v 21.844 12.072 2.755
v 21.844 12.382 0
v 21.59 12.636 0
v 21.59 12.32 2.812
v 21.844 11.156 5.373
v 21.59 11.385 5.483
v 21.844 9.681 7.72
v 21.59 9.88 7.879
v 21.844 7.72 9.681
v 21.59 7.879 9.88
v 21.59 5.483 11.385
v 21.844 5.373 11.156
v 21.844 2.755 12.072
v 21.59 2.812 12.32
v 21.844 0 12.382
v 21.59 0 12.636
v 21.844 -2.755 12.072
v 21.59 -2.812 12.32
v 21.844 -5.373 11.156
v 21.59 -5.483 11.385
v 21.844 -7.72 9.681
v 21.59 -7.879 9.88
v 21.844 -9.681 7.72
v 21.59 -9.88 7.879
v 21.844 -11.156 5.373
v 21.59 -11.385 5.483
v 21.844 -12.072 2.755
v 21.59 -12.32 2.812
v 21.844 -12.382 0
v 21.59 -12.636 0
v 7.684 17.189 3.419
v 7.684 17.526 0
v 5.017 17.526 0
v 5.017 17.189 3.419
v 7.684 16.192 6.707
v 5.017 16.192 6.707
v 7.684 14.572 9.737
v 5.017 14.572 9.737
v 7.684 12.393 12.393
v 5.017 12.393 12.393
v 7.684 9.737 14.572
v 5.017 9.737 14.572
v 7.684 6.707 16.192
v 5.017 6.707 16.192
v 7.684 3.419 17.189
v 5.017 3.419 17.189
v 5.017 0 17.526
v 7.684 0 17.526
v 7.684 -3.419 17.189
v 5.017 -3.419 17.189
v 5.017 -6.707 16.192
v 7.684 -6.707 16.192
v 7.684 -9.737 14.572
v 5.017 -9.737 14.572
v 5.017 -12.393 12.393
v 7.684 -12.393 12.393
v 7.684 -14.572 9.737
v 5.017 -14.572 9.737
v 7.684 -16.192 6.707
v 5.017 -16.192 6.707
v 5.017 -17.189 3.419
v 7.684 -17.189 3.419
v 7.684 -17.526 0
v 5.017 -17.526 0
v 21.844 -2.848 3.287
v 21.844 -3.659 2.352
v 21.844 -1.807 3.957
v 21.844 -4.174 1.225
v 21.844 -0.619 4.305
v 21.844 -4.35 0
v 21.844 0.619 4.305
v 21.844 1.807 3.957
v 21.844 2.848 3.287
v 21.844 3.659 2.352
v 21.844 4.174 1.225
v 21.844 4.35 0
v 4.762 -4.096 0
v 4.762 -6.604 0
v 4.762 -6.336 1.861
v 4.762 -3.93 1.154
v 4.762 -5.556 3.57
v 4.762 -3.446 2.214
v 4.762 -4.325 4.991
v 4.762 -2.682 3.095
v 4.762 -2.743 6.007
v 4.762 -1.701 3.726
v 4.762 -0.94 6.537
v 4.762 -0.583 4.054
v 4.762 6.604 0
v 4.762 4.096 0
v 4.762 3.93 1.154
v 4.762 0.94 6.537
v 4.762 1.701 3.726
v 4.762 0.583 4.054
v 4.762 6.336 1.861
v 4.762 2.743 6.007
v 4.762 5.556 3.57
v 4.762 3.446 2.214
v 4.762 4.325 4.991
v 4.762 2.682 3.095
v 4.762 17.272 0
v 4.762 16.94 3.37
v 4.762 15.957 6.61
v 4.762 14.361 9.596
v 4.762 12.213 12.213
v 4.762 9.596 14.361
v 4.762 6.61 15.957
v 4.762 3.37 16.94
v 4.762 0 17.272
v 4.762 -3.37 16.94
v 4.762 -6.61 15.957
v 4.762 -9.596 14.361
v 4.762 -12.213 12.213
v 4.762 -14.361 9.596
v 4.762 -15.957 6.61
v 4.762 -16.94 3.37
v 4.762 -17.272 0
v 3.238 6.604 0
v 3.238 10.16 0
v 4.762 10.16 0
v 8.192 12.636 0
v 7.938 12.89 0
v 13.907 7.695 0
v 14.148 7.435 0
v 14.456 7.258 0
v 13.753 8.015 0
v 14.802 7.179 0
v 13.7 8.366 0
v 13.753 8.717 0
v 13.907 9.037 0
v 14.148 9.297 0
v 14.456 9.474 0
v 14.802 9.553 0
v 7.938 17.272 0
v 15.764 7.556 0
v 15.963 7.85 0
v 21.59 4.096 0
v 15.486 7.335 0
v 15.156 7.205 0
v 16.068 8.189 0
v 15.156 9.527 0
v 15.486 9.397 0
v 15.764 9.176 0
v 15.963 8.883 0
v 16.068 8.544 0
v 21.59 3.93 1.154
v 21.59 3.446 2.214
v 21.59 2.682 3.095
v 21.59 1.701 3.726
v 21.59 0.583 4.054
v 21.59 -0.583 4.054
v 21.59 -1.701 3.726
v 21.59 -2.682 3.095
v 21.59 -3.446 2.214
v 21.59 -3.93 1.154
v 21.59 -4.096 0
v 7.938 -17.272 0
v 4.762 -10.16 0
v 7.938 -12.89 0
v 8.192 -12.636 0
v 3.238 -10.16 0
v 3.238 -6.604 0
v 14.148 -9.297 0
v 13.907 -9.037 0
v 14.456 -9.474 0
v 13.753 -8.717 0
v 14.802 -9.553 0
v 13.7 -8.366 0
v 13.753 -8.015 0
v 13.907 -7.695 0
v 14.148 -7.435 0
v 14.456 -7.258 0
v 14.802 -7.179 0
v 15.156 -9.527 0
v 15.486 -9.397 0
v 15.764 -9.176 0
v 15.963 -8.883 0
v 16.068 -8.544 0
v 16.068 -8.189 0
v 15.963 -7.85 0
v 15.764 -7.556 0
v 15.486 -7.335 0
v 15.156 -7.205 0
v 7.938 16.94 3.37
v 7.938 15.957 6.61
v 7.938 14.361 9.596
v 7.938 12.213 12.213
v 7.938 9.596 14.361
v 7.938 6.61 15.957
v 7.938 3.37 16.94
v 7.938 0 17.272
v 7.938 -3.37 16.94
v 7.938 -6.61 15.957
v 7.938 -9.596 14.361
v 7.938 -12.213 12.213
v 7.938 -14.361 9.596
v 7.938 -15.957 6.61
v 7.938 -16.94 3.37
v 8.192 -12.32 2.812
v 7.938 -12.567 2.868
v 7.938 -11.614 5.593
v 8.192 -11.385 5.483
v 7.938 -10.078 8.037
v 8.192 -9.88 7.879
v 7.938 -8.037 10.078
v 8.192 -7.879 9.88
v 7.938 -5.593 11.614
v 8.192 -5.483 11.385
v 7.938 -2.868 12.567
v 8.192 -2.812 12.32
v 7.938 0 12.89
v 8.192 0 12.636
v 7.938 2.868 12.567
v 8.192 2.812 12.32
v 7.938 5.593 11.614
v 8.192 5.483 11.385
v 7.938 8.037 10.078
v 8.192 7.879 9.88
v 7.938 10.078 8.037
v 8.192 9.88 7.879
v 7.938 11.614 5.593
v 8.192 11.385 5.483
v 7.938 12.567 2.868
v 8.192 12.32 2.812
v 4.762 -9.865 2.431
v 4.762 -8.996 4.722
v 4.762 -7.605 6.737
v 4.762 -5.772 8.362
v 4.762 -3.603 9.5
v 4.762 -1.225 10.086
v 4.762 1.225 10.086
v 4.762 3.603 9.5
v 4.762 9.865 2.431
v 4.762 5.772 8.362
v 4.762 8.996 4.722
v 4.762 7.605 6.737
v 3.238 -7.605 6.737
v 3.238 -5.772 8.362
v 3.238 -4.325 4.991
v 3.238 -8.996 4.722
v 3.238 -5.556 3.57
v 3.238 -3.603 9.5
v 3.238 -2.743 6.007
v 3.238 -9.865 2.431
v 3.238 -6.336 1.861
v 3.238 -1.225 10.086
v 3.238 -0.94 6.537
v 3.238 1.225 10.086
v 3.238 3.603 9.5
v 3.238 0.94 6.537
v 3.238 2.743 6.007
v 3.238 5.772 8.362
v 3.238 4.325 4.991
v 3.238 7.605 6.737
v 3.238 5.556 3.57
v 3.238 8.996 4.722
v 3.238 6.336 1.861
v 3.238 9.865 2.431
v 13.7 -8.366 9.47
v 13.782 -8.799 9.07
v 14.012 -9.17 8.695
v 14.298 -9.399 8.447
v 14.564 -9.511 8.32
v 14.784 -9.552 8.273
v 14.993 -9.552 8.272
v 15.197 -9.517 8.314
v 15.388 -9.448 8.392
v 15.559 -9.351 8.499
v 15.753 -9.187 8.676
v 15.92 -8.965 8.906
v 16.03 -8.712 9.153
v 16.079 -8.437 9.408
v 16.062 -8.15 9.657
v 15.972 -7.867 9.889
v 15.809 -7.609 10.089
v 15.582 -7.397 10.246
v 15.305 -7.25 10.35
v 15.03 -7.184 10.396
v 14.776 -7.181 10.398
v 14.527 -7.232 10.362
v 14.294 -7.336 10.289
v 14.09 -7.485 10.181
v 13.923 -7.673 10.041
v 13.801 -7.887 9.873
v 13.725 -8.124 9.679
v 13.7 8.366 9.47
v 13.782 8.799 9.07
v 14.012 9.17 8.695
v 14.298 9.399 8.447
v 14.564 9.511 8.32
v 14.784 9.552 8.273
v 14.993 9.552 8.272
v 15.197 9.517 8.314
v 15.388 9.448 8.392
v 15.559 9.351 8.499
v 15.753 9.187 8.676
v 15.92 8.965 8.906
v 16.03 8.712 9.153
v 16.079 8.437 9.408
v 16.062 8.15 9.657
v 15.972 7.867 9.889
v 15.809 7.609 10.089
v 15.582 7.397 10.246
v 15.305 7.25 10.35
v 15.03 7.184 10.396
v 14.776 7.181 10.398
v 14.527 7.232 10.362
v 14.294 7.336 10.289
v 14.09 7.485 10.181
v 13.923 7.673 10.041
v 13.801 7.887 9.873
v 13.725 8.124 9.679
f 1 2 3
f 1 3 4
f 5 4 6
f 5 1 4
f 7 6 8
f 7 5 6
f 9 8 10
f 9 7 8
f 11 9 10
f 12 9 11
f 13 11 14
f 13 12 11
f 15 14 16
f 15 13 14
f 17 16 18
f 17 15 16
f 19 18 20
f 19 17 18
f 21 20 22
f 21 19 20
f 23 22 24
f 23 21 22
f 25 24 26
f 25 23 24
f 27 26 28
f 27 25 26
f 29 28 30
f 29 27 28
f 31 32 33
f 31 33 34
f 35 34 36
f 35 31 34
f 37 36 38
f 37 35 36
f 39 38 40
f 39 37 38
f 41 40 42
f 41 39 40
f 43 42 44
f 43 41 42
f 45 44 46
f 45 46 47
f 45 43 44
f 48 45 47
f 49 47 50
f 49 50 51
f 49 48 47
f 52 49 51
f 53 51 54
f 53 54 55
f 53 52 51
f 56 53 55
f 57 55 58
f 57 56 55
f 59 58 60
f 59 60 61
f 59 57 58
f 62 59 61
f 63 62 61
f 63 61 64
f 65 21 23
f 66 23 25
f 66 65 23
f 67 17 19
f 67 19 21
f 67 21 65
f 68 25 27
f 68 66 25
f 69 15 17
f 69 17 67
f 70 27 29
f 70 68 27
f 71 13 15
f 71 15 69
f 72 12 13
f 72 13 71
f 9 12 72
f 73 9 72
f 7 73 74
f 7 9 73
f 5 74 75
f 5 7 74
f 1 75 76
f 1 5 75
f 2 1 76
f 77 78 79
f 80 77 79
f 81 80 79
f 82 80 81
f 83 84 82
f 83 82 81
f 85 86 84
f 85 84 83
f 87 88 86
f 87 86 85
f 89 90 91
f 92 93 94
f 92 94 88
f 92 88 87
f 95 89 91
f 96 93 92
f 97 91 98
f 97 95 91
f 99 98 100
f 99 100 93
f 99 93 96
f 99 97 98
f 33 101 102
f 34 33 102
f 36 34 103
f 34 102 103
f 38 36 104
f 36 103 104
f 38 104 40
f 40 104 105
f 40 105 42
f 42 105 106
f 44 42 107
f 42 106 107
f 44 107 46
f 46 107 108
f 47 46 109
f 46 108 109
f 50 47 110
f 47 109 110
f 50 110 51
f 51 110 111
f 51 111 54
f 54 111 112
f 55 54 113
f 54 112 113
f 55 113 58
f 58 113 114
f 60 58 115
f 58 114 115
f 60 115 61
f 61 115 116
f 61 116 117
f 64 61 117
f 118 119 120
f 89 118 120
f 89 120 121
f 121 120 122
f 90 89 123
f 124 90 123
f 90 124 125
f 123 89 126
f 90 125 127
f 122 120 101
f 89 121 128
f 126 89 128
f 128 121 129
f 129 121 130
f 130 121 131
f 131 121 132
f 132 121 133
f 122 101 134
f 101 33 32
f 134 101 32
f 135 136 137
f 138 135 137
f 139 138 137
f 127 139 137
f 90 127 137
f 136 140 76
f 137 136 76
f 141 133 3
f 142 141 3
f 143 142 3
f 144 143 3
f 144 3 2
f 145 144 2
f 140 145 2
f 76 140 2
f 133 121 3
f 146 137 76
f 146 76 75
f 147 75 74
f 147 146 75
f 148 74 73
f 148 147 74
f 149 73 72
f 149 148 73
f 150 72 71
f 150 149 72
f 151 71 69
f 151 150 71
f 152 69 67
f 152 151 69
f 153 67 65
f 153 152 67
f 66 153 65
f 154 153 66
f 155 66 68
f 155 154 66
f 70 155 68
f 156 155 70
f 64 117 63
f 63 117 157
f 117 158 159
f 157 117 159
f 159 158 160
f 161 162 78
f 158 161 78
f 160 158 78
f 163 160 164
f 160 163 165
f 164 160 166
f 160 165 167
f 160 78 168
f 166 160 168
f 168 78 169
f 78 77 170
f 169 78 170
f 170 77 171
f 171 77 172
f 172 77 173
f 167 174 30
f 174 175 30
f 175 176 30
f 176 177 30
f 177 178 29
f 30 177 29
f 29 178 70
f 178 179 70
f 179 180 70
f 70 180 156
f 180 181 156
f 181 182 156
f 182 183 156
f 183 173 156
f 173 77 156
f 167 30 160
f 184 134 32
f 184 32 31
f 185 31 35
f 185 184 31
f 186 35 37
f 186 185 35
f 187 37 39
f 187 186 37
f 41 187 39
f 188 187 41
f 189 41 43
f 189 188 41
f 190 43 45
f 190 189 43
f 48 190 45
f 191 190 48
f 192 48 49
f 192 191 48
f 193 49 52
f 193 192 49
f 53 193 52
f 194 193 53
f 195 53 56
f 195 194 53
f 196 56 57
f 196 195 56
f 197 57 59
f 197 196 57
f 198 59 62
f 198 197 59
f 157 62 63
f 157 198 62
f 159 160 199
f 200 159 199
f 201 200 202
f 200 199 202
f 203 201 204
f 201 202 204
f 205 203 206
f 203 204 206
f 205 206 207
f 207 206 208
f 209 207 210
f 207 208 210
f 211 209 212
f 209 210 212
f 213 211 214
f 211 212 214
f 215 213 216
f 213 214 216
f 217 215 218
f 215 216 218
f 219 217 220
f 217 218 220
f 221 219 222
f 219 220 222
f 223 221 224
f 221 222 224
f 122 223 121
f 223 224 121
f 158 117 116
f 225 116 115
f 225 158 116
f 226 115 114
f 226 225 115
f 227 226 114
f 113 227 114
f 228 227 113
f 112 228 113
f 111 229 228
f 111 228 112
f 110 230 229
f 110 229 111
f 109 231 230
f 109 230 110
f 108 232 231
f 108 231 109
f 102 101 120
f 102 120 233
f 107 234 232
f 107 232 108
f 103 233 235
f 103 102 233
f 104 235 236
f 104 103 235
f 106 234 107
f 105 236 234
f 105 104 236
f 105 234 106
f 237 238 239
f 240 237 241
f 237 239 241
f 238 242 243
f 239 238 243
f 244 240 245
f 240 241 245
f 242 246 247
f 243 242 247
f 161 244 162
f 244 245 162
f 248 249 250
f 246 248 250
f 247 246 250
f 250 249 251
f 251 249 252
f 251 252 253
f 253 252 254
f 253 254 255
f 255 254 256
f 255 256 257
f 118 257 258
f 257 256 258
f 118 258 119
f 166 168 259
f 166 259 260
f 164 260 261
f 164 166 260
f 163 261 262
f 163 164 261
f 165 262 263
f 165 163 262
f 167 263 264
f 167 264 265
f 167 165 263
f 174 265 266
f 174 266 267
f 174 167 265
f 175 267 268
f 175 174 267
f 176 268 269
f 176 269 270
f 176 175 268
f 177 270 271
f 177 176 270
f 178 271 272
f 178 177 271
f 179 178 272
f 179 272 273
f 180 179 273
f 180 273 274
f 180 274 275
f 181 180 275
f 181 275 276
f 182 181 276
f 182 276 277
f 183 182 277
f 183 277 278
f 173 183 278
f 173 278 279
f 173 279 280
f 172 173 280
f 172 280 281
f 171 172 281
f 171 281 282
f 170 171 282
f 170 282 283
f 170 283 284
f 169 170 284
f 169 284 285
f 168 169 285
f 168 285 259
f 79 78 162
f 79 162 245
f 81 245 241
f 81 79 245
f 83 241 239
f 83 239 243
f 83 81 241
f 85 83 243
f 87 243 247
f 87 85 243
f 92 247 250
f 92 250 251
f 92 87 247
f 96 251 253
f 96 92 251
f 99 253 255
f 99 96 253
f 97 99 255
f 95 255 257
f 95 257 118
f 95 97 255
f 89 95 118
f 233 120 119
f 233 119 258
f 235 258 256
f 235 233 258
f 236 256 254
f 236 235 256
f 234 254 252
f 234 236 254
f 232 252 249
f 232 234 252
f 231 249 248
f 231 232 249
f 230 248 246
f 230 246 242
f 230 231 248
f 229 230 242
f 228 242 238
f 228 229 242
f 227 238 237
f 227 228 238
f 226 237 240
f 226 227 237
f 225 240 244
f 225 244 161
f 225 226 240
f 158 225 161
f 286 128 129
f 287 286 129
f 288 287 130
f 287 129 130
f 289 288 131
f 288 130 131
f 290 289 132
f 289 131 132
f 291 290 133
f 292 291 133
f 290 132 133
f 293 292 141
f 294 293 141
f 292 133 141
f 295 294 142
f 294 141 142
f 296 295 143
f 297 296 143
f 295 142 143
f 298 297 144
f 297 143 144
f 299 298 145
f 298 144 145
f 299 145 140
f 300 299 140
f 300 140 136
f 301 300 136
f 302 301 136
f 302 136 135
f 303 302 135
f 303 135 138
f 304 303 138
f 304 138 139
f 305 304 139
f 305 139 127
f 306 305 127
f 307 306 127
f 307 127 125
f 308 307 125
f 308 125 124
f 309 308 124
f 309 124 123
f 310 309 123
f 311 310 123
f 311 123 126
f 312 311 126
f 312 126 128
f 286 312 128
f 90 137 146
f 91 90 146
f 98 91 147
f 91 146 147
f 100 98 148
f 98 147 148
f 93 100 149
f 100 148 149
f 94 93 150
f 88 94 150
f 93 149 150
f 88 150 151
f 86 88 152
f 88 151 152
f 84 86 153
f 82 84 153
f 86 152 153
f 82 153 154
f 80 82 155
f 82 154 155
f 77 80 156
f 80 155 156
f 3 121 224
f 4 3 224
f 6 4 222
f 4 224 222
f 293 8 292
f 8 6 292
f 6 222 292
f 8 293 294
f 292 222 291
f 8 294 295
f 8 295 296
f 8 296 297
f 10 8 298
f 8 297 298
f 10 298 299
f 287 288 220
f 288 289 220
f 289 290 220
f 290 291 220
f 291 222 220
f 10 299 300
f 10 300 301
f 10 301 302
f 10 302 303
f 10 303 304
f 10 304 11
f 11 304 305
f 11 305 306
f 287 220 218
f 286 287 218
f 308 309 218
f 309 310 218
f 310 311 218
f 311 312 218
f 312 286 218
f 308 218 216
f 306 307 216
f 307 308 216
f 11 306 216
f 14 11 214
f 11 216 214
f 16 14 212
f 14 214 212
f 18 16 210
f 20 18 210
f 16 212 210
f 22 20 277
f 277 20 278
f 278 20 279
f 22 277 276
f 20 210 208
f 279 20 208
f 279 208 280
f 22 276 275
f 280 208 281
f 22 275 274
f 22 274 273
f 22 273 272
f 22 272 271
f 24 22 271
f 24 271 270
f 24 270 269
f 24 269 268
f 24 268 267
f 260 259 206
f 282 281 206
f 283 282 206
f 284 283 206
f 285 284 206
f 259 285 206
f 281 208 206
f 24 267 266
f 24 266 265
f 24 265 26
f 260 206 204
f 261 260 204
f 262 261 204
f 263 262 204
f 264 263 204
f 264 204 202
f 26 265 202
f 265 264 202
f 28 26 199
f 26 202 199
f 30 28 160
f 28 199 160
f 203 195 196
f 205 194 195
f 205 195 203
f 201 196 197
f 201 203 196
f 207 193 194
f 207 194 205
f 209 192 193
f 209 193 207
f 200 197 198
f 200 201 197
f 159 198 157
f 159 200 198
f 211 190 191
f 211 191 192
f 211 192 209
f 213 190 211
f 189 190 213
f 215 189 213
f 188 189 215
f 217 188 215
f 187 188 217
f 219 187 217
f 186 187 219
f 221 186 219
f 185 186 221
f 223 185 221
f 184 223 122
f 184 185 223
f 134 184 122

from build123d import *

# Parameters (mm, degrees)
SKETCH1_R           = 12.6365
BOSS_EXTRUDE1_DEPTH = 21.844
SKETCH2_R           = 17.526
BOSS_EXTRUDE2_DEPTH = 3.175
CHAMFER1_SIZE       = 0.254
SKETCH3_R           = 4.09575
CUT_EXTRUDE1_DEPTH  = 34.037579936
CHAMFER2_SIZE       = 0.254
SKETCH4_R           = 1.984375
CUT_EXTRUDE2_DEPTH  = 22.606
SKETCH5_R           = 12.8905
CUT_EXTRUDE3_DEPTH  = 4.7625
SKETCH6_W           = 26.198256486
SKETCH6_H           = 39.009491802
CUT_EXTRUDE4_DEPTH  = 41.783
SKETCH7_R           = 1.190625
CUT_EXTRUDE5_DEPTH  = 12.7
BOSS_EXTRUDE3_DEPTH = 1.524


with BuildPart() as part:
    # Sketch1 → Boss-Extrude1 (new body)
    with BuildSketch(Plane(origin=(0, 0, 0), x_dir=(0, 0, -1), z_dir=(1, 0, 0))):
        Circle(SKETCH1_R)
    extrude(amount=BOSS_EXTRUDE1_DEPTH)

    # Sketch2 → Boss-Extrude2 (add)
    with BuildSketch(Plane(origin=(7.9375, 0, 0), x_dir=(0, 0, -1), z_dir=(1, 0, 0))):
        Circle(SKETCH2_R)
    extrude(amount=-BOSS_EXTRUDE2_DEPTH)

    # Chamfer1
    chamfer1_edges = [part.edges().sort_by_distance(p)[0] for p in [
        (0, 0, 12.6365),
        (21.844, 0, 12.6365),
        (4.7625, 0, 12.6365),
        (7.9375, 0, 12.6365),
        (4.7625, 0, 17.526),
        (7.9375, 0, 17.526),
    ]]
    chamfer(chamfer1_edges, length=CHAMFER1_SIZE)

    # Sketch3 → Cut-Extrude1 (cut, through all)
    with BuildSketch(Plane(origin=(21.844, 0, 0), x_dir=(0, 0, -1), z_dir=(1, 0, 0))):
        Circle(SKETCH3_R)
    extrude(amount=-CUT_EXTRUDE1_DEPTH, mode=Mode.SUBTRACT)

    # Chamfer2
    chamfer2_edges = [part.edges().sort_by_distance(p)[0] for p in [
        (0, 0, 4.09575),
        (21.844, 0, 4.09575),
    ]]
    chamfer(chamfer2_edges, length=CHAMFER2_SIZE)

    # Sketch4 → Cut-Extrude2 (cut)
    with BuildSketch(Plane.XY):
        with Locations((14.89075, 0)):
            Circle(SKETCH4_R)
    extrude(amount=-CUT_EXTRUDE2_DEPTH, mode=Mode.SUBTRACT)

    # Sketch5 → Cut-Extrude3 (cut)
    with BuildSketch(Plane.ZY):
        Circle(SKETCH5_R)
    extrude(amount=-CUT_EXTRUDE3_DEPTH, mode=Mode.SUBTRACT)

    # Sketch6 → Cut-Extrude4 (cut)
    with BuildSketch(Plane.XY):
        with Locations((13.991232321, 0)):
            Rectangle(SKETCH6_W, SKETCH6_H)
    extrude(amount=-CUT_EXTRUDE4_DEPTH, mode=Mode.SUBTRACT)

    # Sketch7 → Cut-Extrude5 (cut)
    with BuildSketch(Plane(origin=(0, 0, 0), x_dir=(-1, 0, 0), z_dir=(0, 0, -1))):
        with Locations((-14.89075, 8.366125)):
            Circle(SKETCH7_R)
    cut_extrude5 = extrude(amount=-CUT_EXTRUDE5_DEPTH, mode=Mode.SUBTRACT)

    # Mirror1: Cut-Extrude5 across plane
    add(cut_extrude5.mirror(Plane.ZX), mode=Mode.SUBTRACT)

    # Sketch8 → Boss-Extrude3 (add)
    with BuildSketch(Plane.ZY.offset(-4.7625)):
        with BuildLine():
            Line((0, -10.16), (0, -6.604))
            ThreePointArc((0, -6.604), (6.604, 0), (0, 6.604))
            Line((0, 6.604), (0, 10.16))
            ThreePointArc((0, 10.16), (10.16, 0), (0, -10.16))
        make_face()
    extrude(amount=BOSS_EXTRUDE3_DEPTH)


solid = part.part
